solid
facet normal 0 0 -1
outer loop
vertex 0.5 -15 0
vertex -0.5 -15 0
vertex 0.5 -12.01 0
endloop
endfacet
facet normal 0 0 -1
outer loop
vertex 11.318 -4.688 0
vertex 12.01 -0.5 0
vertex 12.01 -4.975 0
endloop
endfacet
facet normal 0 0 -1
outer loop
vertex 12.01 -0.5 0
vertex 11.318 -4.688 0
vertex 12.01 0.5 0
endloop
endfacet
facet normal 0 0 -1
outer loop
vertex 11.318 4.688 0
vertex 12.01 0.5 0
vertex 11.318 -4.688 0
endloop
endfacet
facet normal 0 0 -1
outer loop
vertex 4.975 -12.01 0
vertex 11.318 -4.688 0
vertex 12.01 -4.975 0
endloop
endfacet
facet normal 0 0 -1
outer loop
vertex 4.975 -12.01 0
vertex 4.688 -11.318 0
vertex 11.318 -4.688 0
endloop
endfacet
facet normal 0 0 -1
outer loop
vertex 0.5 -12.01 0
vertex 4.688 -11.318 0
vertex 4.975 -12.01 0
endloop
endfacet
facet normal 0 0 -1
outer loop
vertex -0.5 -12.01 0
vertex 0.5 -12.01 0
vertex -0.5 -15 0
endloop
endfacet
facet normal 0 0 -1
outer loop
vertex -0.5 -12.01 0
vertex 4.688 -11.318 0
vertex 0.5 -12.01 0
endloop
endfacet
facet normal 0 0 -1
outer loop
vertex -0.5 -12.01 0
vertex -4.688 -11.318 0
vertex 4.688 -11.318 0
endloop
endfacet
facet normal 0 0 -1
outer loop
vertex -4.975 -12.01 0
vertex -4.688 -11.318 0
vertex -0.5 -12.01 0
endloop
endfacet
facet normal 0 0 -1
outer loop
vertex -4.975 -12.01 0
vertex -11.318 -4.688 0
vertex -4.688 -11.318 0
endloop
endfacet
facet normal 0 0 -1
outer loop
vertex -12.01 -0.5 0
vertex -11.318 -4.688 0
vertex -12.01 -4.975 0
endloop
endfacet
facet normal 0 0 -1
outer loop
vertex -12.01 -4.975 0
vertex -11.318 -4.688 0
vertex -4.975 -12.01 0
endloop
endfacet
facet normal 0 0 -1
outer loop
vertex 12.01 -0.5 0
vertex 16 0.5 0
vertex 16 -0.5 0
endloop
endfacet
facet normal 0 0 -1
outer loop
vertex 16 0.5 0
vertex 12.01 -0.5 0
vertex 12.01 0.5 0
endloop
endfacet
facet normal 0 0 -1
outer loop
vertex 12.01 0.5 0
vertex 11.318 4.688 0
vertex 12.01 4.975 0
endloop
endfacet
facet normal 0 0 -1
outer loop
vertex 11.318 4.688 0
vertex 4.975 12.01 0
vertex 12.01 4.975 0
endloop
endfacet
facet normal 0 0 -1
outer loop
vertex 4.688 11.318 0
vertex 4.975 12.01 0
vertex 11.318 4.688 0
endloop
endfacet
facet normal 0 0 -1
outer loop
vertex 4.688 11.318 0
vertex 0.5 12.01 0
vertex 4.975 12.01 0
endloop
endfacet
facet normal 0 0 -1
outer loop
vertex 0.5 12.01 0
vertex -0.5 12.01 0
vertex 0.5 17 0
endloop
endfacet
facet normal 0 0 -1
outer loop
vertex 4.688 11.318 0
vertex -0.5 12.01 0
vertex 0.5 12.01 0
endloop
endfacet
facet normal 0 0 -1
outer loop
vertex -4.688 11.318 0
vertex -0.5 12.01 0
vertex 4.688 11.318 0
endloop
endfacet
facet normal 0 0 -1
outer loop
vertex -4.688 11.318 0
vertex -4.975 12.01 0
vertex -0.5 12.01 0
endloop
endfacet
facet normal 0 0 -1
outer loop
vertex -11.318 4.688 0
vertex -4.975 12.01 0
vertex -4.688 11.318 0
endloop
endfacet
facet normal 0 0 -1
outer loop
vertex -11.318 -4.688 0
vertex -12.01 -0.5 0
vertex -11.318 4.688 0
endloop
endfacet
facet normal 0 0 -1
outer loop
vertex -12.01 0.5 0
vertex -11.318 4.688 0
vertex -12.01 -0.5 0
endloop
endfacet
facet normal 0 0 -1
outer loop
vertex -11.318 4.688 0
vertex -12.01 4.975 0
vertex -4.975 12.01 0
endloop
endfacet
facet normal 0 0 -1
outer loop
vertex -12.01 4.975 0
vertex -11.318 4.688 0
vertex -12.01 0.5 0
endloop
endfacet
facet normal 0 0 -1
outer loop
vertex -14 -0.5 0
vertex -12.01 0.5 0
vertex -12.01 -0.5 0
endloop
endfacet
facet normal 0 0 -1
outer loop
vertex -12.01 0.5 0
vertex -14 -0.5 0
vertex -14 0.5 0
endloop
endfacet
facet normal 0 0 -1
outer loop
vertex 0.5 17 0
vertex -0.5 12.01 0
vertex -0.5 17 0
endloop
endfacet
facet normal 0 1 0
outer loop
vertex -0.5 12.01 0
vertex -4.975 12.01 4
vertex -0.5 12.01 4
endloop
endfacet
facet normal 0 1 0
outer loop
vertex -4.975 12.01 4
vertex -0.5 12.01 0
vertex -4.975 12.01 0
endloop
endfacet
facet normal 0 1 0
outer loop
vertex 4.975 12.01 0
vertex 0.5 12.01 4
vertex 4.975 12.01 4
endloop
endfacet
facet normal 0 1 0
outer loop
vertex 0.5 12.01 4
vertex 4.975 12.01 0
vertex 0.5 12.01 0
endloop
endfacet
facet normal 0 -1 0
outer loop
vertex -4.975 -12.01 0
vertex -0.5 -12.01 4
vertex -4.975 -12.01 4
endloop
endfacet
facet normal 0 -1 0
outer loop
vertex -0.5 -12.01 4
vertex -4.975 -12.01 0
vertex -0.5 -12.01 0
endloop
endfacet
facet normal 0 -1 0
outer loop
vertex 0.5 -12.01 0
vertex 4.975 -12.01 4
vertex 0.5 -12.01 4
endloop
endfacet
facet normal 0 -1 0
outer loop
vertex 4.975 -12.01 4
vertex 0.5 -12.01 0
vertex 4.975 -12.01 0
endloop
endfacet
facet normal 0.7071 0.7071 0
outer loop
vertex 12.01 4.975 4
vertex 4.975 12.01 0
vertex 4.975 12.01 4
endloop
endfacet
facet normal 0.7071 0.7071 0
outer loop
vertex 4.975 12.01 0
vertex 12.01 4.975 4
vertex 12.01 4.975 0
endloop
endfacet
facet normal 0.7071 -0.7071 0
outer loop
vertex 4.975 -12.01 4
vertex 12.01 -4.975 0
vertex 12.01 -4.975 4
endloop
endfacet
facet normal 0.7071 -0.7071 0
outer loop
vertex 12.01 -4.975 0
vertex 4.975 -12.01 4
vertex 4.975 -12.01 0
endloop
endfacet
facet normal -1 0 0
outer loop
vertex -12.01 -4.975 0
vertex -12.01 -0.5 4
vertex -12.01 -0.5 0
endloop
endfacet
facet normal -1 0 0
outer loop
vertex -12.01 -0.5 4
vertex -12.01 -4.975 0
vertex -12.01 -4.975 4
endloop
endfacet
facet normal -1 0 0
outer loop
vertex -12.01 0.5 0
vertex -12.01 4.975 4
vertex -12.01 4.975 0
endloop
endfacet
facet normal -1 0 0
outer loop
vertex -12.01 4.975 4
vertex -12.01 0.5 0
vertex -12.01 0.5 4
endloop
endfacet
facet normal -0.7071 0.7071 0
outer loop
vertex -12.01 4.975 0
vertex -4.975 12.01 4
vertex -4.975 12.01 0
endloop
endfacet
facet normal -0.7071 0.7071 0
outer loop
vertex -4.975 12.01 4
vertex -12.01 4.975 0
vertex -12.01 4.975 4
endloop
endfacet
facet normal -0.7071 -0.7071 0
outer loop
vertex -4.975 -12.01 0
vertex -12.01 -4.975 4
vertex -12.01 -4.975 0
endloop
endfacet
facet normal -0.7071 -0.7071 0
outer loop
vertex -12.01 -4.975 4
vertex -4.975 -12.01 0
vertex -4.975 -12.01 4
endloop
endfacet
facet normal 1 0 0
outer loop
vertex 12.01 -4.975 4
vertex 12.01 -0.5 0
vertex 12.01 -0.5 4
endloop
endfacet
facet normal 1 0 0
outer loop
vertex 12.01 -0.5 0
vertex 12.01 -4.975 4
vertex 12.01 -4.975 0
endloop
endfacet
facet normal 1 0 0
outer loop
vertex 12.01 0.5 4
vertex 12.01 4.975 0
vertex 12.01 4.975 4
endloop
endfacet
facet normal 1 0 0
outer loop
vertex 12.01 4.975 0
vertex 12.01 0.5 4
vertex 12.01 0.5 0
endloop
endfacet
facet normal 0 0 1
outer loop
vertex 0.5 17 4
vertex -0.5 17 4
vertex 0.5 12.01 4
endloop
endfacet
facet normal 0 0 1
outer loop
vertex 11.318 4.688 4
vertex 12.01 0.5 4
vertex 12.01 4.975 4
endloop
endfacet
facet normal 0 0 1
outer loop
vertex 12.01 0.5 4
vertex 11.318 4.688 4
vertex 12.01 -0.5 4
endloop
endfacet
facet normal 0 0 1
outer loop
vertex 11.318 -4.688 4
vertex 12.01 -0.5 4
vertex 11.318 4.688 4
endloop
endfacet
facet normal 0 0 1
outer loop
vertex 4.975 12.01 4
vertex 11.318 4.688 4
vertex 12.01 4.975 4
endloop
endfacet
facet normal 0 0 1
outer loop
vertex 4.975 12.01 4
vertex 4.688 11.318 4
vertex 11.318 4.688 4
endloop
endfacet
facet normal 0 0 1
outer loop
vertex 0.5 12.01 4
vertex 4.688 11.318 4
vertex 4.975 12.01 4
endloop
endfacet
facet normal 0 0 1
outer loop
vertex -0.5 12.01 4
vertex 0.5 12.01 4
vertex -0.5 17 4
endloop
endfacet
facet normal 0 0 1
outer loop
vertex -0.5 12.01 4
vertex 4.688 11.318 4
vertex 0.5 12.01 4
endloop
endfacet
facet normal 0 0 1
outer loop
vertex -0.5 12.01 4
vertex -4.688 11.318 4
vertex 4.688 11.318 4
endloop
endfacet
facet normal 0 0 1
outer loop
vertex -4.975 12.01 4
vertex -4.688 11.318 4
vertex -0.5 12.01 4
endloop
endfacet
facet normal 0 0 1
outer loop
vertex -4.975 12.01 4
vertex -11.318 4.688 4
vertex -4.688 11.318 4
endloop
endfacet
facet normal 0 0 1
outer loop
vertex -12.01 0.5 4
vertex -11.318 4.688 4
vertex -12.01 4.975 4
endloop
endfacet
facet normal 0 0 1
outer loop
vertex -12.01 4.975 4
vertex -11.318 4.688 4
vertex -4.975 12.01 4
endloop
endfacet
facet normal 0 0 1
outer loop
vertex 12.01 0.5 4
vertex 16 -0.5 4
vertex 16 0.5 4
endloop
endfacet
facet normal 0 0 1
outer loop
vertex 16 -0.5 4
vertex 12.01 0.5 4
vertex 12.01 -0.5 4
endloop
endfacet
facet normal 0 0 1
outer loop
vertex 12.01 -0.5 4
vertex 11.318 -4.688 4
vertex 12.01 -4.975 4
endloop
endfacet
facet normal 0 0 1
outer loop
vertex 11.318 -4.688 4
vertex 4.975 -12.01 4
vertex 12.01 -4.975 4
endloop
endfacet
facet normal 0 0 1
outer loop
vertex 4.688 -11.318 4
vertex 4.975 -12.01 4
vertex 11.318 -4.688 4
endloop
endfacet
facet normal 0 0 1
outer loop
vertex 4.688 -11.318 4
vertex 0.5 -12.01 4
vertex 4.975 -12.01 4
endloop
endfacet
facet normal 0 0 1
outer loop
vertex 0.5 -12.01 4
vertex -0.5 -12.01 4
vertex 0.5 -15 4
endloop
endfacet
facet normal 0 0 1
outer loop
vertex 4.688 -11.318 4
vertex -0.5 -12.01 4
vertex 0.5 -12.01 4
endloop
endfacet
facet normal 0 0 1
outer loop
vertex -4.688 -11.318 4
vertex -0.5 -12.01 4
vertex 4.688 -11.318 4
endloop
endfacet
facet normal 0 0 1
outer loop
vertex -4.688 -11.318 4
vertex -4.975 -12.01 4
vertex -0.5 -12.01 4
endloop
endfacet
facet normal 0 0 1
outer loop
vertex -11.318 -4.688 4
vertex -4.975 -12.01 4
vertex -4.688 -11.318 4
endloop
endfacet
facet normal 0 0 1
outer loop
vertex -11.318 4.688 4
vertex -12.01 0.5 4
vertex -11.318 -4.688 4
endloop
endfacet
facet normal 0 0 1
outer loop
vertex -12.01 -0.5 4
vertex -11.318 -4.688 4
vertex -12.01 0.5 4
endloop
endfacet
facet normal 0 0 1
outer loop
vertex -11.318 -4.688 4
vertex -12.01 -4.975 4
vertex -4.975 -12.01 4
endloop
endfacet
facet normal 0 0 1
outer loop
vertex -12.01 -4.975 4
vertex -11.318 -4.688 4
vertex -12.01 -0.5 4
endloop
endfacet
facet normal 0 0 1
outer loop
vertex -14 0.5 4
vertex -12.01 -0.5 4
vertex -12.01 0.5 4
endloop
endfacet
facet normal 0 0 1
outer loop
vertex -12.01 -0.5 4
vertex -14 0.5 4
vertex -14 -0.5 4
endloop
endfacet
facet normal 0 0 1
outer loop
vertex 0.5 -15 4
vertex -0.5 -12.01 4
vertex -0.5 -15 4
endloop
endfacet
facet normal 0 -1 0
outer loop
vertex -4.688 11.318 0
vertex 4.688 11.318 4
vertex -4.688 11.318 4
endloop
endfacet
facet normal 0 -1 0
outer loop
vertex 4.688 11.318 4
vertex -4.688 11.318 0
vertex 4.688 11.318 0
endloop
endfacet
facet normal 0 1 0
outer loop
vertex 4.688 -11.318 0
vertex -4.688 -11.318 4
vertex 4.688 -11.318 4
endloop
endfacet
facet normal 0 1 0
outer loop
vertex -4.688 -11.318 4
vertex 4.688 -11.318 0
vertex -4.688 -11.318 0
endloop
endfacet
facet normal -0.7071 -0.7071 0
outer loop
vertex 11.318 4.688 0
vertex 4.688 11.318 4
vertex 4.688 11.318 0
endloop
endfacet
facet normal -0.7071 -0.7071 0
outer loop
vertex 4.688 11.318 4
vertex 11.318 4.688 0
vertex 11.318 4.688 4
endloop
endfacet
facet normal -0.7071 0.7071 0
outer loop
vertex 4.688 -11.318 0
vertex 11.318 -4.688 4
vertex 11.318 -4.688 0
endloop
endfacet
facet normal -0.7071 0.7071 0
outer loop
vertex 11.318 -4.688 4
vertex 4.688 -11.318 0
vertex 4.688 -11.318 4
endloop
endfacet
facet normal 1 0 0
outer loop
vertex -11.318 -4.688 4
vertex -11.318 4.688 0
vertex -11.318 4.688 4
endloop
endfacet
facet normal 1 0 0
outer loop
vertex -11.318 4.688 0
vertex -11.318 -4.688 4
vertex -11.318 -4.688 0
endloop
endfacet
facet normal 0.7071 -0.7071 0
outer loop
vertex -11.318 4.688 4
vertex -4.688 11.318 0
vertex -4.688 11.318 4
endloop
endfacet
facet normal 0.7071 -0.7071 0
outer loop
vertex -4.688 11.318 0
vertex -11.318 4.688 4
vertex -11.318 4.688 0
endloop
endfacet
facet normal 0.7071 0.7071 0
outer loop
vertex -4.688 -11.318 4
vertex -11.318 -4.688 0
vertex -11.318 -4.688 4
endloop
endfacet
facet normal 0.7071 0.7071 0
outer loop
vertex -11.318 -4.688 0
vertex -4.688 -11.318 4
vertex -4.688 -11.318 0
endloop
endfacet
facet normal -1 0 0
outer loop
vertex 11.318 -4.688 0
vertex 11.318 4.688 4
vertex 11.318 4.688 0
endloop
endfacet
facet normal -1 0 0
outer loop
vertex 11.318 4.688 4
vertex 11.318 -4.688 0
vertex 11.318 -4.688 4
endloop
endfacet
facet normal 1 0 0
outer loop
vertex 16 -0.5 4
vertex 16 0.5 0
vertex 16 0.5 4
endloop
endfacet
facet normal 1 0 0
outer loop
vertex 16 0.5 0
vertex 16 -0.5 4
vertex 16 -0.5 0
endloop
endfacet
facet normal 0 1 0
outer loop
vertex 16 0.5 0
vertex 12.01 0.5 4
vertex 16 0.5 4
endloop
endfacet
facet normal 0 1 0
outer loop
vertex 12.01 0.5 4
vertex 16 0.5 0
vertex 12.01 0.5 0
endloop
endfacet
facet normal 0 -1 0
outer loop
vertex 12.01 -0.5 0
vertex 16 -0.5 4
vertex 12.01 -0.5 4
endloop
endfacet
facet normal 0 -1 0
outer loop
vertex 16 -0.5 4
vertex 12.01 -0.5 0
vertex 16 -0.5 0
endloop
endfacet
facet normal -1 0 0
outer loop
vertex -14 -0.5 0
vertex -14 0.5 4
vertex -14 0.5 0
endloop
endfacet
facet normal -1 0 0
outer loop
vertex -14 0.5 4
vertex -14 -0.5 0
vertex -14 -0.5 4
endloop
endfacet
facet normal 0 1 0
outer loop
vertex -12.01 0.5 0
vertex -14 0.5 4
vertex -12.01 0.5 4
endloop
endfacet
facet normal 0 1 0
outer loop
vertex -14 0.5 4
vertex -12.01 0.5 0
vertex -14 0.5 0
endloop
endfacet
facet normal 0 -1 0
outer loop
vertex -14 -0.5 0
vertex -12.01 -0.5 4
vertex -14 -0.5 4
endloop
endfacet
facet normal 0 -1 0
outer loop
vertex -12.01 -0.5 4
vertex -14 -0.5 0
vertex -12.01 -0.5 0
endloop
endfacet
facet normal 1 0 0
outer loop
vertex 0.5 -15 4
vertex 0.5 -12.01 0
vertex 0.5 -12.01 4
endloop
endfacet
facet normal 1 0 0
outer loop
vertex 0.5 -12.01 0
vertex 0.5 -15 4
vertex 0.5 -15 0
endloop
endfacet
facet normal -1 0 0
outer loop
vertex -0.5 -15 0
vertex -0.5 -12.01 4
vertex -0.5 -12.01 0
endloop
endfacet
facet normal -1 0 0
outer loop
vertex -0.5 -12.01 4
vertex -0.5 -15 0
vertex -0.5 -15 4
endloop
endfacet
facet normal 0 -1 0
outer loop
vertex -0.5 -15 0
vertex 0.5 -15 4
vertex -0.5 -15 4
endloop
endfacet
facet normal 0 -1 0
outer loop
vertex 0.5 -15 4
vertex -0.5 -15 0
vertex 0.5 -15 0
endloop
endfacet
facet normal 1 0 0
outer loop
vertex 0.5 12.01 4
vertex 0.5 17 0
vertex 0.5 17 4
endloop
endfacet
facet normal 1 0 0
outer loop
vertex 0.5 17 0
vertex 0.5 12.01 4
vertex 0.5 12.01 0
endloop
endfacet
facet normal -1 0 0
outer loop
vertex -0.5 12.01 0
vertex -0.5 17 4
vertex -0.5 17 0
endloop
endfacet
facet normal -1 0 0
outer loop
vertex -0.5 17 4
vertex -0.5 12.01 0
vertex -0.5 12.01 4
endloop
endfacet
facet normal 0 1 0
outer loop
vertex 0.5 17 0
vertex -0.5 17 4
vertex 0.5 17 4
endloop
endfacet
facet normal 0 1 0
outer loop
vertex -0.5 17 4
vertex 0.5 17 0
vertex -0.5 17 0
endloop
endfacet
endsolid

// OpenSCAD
echo(version=version());
// Increase the visual detail
$fn = 100;

// Ring

module ring() {
    difference() {
        rotate([0,0,22.5])
        linear_extrude(4)
        translate([0, 0]) circle(d=26,$fn=8);
         
        color("red")
        rotate([0,0,22.5])
        linear_extrude(4)
        translate([0, 0]) circle(d=24.5,$fn=8);  
    }    
}    
 
// Top

color("blue")
translate([12, -0.5, 0])
cube([4,1,4]);

// Bot

color("blue")
translate([-14, -0.5, 0])
cube([2,1,4]);

// Right

color("blue")
translate([-0.5, -15, 0])
cube([1,3,4]);

// Left

color("blue")
translate([-0.5, 12, 0])
cube([1,5,4]);


// Modules

ring();
